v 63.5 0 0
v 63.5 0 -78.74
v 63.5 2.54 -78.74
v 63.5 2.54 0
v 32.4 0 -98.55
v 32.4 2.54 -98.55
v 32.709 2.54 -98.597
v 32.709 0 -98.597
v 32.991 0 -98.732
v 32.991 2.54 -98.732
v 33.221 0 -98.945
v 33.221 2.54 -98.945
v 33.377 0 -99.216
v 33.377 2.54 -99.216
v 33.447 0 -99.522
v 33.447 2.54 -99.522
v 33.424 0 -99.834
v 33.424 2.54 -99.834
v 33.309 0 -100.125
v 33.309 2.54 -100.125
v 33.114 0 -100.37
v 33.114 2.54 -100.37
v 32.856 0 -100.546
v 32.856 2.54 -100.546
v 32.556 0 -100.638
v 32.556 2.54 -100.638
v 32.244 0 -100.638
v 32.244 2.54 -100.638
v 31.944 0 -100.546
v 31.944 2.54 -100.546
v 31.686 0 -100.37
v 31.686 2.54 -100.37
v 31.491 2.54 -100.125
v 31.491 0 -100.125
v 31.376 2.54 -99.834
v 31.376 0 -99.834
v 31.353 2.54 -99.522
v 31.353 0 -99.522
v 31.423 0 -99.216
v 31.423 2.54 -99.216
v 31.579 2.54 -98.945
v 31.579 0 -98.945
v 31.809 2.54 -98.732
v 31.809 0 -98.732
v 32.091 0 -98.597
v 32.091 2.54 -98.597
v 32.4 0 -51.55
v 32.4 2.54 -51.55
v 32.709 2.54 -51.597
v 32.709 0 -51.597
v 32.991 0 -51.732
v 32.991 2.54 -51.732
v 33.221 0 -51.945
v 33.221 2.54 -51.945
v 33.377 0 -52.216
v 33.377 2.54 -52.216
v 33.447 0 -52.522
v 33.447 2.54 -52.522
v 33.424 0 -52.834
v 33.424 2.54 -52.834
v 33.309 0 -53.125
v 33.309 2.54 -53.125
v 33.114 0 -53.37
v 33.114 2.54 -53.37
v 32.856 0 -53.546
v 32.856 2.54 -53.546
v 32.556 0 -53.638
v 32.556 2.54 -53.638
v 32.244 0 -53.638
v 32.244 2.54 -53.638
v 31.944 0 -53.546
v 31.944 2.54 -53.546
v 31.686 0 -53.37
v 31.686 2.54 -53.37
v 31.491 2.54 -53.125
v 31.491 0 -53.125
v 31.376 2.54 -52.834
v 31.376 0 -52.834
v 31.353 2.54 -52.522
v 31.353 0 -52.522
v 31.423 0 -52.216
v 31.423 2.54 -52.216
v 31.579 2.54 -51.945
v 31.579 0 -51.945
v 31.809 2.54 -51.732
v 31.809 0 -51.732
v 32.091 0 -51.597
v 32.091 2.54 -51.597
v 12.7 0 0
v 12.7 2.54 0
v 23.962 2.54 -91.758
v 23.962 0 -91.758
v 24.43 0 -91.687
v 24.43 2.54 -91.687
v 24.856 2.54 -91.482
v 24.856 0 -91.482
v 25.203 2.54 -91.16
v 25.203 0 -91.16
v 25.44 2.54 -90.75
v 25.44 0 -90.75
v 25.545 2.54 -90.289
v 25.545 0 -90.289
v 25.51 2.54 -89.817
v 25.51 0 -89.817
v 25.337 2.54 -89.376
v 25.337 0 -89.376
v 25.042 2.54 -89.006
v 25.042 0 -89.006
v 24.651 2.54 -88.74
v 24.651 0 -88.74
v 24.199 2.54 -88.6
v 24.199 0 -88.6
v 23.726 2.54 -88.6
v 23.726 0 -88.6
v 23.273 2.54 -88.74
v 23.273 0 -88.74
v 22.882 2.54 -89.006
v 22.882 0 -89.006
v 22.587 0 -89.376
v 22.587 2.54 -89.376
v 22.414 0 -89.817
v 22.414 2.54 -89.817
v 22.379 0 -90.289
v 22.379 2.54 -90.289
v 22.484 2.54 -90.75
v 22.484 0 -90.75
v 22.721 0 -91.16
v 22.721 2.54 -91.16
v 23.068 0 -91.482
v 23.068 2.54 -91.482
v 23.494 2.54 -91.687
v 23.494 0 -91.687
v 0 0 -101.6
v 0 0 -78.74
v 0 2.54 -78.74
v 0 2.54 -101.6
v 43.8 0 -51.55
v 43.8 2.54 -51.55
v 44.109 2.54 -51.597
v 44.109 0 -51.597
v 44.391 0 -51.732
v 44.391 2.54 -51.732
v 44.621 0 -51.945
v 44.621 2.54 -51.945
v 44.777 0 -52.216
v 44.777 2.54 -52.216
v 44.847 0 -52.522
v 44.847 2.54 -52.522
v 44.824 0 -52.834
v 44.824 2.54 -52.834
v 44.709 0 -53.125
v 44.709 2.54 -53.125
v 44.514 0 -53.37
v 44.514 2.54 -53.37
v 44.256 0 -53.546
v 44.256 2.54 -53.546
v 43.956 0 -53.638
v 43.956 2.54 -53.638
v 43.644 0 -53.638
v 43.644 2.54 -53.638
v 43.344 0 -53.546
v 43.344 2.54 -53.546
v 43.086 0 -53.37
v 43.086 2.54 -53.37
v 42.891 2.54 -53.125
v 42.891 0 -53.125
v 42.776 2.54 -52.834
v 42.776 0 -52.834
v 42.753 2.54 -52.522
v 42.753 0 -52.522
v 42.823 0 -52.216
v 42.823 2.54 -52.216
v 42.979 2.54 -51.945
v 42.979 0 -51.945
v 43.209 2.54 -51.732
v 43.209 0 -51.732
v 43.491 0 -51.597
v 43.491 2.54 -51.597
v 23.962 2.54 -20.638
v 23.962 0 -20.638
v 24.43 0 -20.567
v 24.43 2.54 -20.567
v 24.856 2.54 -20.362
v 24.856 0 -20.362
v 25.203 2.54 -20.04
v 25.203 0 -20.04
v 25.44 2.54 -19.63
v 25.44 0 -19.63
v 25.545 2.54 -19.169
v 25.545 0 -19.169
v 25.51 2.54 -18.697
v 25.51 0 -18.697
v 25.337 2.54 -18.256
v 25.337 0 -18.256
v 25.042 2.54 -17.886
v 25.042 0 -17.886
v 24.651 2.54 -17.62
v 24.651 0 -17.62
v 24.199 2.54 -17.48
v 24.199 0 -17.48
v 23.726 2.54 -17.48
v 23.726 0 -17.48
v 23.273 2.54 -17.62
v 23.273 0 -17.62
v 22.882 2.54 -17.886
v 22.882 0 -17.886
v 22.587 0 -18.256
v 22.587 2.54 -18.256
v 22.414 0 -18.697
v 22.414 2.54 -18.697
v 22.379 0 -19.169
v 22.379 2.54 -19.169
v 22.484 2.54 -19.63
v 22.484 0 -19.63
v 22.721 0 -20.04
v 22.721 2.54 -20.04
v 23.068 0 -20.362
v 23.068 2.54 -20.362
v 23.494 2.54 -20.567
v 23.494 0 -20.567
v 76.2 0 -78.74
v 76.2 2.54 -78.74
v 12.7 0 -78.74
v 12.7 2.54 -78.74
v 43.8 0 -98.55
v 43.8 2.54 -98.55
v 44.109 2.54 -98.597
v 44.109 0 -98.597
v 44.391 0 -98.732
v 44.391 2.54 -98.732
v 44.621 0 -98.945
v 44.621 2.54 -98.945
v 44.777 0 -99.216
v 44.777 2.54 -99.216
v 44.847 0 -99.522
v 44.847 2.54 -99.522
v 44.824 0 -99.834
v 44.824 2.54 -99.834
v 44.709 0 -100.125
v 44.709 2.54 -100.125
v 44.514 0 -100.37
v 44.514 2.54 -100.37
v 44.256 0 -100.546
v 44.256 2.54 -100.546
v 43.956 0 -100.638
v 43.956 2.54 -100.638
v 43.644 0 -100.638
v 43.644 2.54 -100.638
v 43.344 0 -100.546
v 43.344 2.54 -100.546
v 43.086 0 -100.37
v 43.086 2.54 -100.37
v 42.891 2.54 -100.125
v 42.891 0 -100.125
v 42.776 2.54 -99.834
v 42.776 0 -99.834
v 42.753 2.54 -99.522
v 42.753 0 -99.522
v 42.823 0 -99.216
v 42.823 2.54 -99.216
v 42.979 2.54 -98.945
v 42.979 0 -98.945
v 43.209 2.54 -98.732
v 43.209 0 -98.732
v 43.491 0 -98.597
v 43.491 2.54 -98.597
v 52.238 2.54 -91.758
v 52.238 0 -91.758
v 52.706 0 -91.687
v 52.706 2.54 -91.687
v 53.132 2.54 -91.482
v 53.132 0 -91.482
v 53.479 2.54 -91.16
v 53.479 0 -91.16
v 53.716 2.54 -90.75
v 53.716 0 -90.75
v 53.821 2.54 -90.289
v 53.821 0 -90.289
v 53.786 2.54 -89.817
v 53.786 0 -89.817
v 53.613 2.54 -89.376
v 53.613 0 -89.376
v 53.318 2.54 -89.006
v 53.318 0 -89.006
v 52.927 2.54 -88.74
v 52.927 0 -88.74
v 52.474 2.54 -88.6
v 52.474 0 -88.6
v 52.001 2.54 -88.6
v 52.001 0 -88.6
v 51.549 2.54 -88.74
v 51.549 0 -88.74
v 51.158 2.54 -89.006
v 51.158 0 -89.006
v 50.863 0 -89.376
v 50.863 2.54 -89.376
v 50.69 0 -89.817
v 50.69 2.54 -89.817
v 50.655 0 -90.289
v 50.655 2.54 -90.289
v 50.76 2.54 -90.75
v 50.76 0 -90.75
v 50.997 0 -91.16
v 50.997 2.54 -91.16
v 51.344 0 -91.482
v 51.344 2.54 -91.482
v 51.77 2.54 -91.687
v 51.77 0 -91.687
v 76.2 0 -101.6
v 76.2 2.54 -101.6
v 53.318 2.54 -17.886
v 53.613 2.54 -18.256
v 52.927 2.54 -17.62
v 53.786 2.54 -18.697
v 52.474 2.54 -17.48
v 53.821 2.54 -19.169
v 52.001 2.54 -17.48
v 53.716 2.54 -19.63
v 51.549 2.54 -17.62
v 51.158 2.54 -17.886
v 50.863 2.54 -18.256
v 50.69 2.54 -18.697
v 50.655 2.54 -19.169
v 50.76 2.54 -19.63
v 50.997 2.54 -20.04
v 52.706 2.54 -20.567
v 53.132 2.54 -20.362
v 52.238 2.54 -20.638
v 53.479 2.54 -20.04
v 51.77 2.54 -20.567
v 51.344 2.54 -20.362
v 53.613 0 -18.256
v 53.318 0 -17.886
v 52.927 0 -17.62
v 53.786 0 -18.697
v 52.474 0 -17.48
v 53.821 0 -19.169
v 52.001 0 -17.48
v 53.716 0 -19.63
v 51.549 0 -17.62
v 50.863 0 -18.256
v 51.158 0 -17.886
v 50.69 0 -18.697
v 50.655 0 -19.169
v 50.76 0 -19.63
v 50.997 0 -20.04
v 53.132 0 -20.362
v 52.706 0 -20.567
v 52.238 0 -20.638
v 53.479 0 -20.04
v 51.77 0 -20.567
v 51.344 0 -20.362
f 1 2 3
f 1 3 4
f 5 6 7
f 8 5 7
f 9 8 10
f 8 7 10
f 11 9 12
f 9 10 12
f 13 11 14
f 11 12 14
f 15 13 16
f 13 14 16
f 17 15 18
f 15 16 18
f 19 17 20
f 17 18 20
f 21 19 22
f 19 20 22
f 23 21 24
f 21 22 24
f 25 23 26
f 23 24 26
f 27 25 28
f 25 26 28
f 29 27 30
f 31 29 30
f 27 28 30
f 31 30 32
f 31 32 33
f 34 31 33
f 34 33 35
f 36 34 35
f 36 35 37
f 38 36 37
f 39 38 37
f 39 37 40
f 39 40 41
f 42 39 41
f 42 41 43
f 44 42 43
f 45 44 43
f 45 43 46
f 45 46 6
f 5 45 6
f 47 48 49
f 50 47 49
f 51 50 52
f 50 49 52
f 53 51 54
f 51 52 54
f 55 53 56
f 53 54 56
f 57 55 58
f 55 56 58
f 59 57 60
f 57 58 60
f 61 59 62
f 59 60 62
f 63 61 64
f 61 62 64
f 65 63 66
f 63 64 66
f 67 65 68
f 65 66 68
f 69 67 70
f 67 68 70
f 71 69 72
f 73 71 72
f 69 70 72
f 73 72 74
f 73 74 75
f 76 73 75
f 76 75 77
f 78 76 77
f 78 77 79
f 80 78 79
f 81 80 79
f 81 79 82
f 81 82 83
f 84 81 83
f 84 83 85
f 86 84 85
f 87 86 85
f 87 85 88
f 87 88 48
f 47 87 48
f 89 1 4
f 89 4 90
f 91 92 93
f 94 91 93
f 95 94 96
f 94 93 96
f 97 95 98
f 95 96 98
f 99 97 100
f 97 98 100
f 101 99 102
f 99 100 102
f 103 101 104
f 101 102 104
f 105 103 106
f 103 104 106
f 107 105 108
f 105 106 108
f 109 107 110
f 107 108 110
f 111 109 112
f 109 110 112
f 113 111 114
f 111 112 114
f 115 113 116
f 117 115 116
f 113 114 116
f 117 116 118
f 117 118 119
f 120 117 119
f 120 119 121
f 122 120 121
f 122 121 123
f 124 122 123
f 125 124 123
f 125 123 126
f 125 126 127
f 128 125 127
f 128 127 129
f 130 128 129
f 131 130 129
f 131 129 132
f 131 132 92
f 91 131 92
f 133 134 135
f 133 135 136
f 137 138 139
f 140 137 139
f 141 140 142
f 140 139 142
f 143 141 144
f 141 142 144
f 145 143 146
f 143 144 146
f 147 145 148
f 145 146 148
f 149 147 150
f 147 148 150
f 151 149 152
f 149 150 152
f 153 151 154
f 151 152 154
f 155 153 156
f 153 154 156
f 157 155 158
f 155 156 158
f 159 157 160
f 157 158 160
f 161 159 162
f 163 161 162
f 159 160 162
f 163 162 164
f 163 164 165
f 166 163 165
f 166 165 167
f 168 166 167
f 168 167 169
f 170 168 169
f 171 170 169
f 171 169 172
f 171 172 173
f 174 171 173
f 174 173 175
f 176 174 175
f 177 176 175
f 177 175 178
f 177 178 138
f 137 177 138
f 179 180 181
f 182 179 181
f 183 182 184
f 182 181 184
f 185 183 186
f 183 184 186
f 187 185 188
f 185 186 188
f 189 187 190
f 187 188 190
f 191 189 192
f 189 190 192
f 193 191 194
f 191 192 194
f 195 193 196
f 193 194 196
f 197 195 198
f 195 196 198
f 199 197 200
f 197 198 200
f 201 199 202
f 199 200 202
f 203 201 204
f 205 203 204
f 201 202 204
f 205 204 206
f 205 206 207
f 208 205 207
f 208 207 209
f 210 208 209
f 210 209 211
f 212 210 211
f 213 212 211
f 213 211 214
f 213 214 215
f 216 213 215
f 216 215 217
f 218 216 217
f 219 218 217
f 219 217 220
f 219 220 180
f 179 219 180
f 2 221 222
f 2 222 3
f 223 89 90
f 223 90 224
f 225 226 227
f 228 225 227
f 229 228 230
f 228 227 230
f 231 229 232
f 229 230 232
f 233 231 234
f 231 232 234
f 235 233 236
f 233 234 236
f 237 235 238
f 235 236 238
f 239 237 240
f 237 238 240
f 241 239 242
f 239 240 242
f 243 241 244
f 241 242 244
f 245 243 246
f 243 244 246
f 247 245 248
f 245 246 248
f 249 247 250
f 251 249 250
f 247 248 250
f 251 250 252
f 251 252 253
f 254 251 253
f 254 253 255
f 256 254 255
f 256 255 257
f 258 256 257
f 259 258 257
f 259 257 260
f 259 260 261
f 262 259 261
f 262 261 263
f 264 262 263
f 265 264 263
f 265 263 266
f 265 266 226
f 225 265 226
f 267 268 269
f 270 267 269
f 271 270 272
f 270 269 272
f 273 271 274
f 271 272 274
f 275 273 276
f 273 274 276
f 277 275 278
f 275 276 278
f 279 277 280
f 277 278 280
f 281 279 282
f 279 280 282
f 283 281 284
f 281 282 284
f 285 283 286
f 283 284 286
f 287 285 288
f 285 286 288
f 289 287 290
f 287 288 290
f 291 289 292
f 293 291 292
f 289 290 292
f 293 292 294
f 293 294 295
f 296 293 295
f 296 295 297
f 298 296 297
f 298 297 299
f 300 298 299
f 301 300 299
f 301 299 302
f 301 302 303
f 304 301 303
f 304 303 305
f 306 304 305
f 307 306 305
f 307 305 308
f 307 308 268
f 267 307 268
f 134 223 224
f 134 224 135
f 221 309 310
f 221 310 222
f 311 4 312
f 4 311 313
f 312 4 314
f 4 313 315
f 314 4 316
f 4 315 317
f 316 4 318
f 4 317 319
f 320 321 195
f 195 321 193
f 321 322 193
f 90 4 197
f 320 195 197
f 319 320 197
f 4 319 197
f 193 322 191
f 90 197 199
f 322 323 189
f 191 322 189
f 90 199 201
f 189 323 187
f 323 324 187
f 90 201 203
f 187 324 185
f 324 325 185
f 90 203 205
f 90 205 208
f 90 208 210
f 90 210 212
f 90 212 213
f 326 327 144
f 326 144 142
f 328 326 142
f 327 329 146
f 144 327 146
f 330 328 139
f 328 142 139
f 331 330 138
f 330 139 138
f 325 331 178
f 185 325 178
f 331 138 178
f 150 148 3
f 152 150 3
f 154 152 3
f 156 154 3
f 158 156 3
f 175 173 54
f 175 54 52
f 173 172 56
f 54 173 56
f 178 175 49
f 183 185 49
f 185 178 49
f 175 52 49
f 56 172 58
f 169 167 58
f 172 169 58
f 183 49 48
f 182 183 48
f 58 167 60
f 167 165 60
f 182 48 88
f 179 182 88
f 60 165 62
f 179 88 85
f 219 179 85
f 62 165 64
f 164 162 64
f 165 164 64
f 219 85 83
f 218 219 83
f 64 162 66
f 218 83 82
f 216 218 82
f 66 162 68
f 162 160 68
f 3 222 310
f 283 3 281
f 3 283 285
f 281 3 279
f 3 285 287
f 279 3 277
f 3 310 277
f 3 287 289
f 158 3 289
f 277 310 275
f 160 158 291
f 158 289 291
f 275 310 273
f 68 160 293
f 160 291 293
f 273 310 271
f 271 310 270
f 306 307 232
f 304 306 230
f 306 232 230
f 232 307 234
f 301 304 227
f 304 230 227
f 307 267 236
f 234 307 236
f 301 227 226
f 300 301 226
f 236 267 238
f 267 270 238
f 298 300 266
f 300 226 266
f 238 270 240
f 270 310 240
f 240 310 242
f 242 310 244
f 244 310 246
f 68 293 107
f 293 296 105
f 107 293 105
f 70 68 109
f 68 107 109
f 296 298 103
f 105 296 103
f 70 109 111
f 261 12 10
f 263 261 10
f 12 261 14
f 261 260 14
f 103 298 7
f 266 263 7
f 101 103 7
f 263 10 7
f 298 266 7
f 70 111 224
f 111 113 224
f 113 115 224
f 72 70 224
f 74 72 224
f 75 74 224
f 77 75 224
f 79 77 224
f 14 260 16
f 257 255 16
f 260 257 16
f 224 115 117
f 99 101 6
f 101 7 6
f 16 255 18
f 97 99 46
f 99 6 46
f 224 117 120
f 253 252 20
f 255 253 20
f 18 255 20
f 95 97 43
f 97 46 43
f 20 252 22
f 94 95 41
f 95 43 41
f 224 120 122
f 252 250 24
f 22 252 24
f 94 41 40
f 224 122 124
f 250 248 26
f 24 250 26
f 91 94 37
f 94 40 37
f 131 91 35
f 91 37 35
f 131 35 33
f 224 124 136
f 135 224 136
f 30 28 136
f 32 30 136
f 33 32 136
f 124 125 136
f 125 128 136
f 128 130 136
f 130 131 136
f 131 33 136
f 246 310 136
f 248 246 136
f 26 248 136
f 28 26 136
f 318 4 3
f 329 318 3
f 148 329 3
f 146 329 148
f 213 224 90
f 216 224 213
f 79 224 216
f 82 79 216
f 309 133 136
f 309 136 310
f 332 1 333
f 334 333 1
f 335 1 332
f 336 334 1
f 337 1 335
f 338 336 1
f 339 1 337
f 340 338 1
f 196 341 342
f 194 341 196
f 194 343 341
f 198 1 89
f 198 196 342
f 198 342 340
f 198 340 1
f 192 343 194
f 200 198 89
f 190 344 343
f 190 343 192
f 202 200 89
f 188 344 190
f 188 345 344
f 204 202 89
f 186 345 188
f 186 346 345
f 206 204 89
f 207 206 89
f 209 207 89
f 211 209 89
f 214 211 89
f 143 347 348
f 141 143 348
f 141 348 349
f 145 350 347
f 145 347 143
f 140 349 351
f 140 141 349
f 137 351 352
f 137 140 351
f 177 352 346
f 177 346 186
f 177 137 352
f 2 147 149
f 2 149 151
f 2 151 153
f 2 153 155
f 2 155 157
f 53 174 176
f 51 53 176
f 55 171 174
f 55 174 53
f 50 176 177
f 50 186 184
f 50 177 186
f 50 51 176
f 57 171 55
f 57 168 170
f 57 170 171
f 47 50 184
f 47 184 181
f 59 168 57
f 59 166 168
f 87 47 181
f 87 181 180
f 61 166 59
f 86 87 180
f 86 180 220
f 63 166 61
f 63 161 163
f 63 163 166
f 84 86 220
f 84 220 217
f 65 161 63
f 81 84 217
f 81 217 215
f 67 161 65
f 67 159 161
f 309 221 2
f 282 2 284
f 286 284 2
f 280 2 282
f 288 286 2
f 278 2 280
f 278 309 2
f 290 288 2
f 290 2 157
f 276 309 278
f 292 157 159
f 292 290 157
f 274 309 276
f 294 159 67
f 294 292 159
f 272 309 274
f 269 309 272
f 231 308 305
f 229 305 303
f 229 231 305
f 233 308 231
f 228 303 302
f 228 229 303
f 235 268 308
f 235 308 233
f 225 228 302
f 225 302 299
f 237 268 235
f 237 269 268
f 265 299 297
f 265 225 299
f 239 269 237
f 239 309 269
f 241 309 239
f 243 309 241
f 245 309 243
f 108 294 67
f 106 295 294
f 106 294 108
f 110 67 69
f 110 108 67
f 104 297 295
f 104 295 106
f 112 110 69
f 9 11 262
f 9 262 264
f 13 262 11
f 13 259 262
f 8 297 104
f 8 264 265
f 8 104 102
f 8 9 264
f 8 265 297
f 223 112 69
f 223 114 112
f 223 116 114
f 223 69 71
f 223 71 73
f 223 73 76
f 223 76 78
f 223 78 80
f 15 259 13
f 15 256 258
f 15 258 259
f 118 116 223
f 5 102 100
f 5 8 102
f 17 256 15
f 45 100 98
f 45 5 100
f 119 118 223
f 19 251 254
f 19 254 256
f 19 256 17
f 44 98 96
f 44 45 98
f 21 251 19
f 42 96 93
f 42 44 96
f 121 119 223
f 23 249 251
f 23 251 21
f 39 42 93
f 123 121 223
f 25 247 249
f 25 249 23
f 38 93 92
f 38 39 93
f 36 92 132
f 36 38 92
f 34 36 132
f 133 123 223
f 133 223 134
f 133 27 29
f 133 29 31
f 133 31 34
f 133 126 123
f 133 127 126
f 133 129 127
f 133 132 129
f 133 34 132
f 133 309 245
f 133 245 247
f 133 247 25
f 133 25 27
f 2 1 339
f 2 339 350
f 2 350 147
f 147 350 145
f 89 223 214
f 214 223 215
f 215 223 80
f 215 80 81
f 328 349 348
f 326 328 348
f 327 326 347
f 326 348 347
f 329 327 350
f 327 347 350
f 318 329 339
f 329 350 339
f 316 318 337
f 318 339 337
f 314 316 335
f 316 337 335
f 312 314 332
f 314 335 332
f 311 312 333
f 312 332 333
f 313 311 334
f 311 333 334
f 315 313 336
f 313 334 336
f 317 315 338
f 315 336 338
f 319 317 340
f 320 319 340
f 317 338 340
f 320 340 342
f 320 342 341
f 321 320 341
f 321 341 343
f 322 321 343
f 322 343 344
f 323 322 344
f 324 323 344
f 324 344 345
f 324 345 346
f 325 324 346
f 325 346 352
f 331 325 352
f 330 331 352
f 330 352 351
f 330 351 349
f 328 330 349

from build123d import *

# Parameters (mm, degrees)
BOSS_EXTRUDE1_DEPTH = 2.54
CUT_EXTRUDE1_REACH  = 129.025
SKETCH2_R           = 1.05
CUT_EXTRUDE2_REACH  = 129.025
SKETCH3_R           = 1.5875


with BuildPart() as part:
    # Sketch1 → Boss-Extrude1 (new body)
    with BuildSketch(Plane(origin=(0, 0, 0), x_dir=(1, 0, 0), z_dir=(0, 1, 0))):
        Polygon((0, 101.6), (76.2, 101.6), (76.2, 78.74), (63.5, 78.74), (63.5, 0), (12.7, 0), (12.7, 78.74), (0, 78.74), align=None)
    extrude(amount=BOSS_EXTRUDE1_DEPTH)

    # Sketch2 → Cut-Extrude1 (cut, up to next)
    with BuildSketch(Plane(origin=(0, 2.54, 0), x_dir=(1, 0, 0), z_dir=(0, 1, 0)), mode=Mode.PRIVATE) as cut_extrude1_sk1:
        with Locations(Location((32.4, 52.6, 0), (0, 0, 270))):
            Circle(SKETCH2_R)
    cut_extrude1_tool1 = extrude(cut_extrude1_sk1.sketch, amount=-CUT_EXTRUDE1_REACH, mode=Mode.PRIVATE) & part.part
    # Sketch2 → Cut-Extrude1 (cut, up to next)
    with BuildSketch(Plane(origin=(0, 2.54, 0), x_dir=(1, 0, 0), z_dir=(0, 1, 0)), mode=Mode.PRIVATE) as cut_extrude1_sk2:
        with Locations(Location((43.8, 52.6, 0), (0, 0, 270))):
            Circle(SKETCH2_R)
    cut_extrude1_tool2 = extrude(cut_extrude1_sk2.sketch, amount=-CUT_EXTRUDE1_REACH, mode=Mode.PRIVATE) & part.part
    # Sketch2 → Cut-Extrude1 (cut, up to next)
    with BuildSketch(Plane(origin=(0, 2.54, 0), x_dir=(1, 0, 0), z_dir=(0, 1, 0)), mode=Mode.PRIVATE) as cut_extrude1_sk3:
        with Locations(Location((43.8, 99.6, 0), (0, 0, 270))):
            Circle(SKETCH2_R)
    cut_extrude1_tool3 = extrude(cut_extrude1_sk3.sketch, amount=-CUT_EXTRUDE1_REACH, mode=Mode.PRIVATE) & part.part
    # Sketch2 → Cut-Extrude1 (cut, up to next)
    with BuildSketch(Plane(origin=(0, 2.54, 0), x_dir=(1, 0, 0), z_dir=(0, 1, 0)), mode=Mode.PRIVATE) as cut_extrude1_sk4:
        with Locations(Location((32.4, 99.6, 0), (0, 0, 270))):
            Circle(SKETCH2_R)
    cut_extrude1_tool4 = extrude(cut_extrude1_sk4.sketch, amount=-CUT_EXTRUDE1_REACH, mode=Mode.PRIVATE) & part.part
    add(cut_extrude1_tool1.solids().sort_by_distance((32.4, 2.54, -52.6))[0], mode=Mode.SUBTRACT)
    add(cut_extrude1_tool2.solids().sort_by_distance((43.8, 2.54, -52.6))[0], mode=Mode.SUBTRACT)
    add(cut_extrude1_tool3.solids().sort_by_distance((43.8, 2.54, -99.6))[0], mode=Mode.SUBTRACT)
    add(cut_extrude1_tool4.solids().sort_by_distance((32.4, 2.54, -99.6))[0], mode=Mode.SUBTRACT)

    # Sketch3 → Cut-Extrude2 (cut, up to next)
    with BuildSketch(Plane(origin=(0, 0, 0), x_dir=(-1, 0, 0), z_dir=(0, -1, 0)), mode=Mode.PRIVATE) as cut_extrude2_sk1:
        with Locations(Location((-23.962149238, 19.05, 0), (0, 0, 90))):
            Circle(SKETCH3_R)
    cut_extrude2_tool1 = extrude(cut_extrude2_sk1.sketch, amount=-CUT_EXTRUDE2_REACH, mode=Mode.PRIVATE) & part.part
    # Sketch3 → Cut-Extrude2 (cut, up to next)
    with BuildSketch(Plane(origin=(0, 0, 0), x_dir=(-1, 0, 0), z_dir=(0, -1, 0)), mode=Mode.PRIVATE) as cut_extrude2_sk2:
        with Locations(Location((-52.237850762, 19.05, 0), (0, 0, 90))):
            Circle(SKETCH3_R)
    cut_extrude2_tool2 = extrude(cut_extrude2_sk2.sketch, amount=-CUT_EXTRUDE2_REACH, mode=Mode.PRIVATE) & part.part
    # Sketch3 → Cut-Extrude2 (cut, up to next)
    with BuildSketch(Plane(origin=(0, 0, 0), x_dir=(-1, 0, 0), z_dir=(0, -1, 0)), mode=Mode.PRIVATE) as cut_extrude2_sk3:
        with Locations(Location((-23.962149238, 90.17, 0), (0, 0, 90))):
            Circle(SKETCH3_R)
    cut_extrude2_tool3 = extrude(cut_extrude2_sk3.sketch, amount=-CUT_EXTRUDE2_REACH, mode=Mode.PRIVATE) & part.part
    # Sketch3 → Cut-Extrude2 (cut, up to next)
    with BuildSketch(Plane(origin=(0, 0, 0), x_dir=(-1, 0, 0), z_dir=(0, -1, 0)), mode=Mode.PRIVATE) as cut_extrude2_sk4:
        with Locations(Location((-52.237850762, 90.17, 0), (0, 0, 90))):
            Circle(SKETCH3_R)
    cut_extrude2_tool4 = extrude(cut_extrude2_sk4.sketch, amount=-CUT_EXTRUDE2_REACH, mode=Mode.PRIVATE) & part.part
    add(cut_extrude2_tool1.solids().sort_by_distance((23.962149, 0, -19.05))[0], mode=Mode.SUBTRACT)
    add(cut_extrude2_tool2.solids().sort_by_distance((52.237851, 0, -19.05))[0], mode=Mode.SUBTRACT)
    add(cut_extrude2_tool3.solids().sort_by_distance((23.962149, 0, -90.17))[0], mode=Mode.SUBTRACT)
    add(cut_extrude2_tool4.solids().sort_by_distance((52.237851, 0, -90.17))[0], mode=Mode.SUBTRACT)


solid = part.part
